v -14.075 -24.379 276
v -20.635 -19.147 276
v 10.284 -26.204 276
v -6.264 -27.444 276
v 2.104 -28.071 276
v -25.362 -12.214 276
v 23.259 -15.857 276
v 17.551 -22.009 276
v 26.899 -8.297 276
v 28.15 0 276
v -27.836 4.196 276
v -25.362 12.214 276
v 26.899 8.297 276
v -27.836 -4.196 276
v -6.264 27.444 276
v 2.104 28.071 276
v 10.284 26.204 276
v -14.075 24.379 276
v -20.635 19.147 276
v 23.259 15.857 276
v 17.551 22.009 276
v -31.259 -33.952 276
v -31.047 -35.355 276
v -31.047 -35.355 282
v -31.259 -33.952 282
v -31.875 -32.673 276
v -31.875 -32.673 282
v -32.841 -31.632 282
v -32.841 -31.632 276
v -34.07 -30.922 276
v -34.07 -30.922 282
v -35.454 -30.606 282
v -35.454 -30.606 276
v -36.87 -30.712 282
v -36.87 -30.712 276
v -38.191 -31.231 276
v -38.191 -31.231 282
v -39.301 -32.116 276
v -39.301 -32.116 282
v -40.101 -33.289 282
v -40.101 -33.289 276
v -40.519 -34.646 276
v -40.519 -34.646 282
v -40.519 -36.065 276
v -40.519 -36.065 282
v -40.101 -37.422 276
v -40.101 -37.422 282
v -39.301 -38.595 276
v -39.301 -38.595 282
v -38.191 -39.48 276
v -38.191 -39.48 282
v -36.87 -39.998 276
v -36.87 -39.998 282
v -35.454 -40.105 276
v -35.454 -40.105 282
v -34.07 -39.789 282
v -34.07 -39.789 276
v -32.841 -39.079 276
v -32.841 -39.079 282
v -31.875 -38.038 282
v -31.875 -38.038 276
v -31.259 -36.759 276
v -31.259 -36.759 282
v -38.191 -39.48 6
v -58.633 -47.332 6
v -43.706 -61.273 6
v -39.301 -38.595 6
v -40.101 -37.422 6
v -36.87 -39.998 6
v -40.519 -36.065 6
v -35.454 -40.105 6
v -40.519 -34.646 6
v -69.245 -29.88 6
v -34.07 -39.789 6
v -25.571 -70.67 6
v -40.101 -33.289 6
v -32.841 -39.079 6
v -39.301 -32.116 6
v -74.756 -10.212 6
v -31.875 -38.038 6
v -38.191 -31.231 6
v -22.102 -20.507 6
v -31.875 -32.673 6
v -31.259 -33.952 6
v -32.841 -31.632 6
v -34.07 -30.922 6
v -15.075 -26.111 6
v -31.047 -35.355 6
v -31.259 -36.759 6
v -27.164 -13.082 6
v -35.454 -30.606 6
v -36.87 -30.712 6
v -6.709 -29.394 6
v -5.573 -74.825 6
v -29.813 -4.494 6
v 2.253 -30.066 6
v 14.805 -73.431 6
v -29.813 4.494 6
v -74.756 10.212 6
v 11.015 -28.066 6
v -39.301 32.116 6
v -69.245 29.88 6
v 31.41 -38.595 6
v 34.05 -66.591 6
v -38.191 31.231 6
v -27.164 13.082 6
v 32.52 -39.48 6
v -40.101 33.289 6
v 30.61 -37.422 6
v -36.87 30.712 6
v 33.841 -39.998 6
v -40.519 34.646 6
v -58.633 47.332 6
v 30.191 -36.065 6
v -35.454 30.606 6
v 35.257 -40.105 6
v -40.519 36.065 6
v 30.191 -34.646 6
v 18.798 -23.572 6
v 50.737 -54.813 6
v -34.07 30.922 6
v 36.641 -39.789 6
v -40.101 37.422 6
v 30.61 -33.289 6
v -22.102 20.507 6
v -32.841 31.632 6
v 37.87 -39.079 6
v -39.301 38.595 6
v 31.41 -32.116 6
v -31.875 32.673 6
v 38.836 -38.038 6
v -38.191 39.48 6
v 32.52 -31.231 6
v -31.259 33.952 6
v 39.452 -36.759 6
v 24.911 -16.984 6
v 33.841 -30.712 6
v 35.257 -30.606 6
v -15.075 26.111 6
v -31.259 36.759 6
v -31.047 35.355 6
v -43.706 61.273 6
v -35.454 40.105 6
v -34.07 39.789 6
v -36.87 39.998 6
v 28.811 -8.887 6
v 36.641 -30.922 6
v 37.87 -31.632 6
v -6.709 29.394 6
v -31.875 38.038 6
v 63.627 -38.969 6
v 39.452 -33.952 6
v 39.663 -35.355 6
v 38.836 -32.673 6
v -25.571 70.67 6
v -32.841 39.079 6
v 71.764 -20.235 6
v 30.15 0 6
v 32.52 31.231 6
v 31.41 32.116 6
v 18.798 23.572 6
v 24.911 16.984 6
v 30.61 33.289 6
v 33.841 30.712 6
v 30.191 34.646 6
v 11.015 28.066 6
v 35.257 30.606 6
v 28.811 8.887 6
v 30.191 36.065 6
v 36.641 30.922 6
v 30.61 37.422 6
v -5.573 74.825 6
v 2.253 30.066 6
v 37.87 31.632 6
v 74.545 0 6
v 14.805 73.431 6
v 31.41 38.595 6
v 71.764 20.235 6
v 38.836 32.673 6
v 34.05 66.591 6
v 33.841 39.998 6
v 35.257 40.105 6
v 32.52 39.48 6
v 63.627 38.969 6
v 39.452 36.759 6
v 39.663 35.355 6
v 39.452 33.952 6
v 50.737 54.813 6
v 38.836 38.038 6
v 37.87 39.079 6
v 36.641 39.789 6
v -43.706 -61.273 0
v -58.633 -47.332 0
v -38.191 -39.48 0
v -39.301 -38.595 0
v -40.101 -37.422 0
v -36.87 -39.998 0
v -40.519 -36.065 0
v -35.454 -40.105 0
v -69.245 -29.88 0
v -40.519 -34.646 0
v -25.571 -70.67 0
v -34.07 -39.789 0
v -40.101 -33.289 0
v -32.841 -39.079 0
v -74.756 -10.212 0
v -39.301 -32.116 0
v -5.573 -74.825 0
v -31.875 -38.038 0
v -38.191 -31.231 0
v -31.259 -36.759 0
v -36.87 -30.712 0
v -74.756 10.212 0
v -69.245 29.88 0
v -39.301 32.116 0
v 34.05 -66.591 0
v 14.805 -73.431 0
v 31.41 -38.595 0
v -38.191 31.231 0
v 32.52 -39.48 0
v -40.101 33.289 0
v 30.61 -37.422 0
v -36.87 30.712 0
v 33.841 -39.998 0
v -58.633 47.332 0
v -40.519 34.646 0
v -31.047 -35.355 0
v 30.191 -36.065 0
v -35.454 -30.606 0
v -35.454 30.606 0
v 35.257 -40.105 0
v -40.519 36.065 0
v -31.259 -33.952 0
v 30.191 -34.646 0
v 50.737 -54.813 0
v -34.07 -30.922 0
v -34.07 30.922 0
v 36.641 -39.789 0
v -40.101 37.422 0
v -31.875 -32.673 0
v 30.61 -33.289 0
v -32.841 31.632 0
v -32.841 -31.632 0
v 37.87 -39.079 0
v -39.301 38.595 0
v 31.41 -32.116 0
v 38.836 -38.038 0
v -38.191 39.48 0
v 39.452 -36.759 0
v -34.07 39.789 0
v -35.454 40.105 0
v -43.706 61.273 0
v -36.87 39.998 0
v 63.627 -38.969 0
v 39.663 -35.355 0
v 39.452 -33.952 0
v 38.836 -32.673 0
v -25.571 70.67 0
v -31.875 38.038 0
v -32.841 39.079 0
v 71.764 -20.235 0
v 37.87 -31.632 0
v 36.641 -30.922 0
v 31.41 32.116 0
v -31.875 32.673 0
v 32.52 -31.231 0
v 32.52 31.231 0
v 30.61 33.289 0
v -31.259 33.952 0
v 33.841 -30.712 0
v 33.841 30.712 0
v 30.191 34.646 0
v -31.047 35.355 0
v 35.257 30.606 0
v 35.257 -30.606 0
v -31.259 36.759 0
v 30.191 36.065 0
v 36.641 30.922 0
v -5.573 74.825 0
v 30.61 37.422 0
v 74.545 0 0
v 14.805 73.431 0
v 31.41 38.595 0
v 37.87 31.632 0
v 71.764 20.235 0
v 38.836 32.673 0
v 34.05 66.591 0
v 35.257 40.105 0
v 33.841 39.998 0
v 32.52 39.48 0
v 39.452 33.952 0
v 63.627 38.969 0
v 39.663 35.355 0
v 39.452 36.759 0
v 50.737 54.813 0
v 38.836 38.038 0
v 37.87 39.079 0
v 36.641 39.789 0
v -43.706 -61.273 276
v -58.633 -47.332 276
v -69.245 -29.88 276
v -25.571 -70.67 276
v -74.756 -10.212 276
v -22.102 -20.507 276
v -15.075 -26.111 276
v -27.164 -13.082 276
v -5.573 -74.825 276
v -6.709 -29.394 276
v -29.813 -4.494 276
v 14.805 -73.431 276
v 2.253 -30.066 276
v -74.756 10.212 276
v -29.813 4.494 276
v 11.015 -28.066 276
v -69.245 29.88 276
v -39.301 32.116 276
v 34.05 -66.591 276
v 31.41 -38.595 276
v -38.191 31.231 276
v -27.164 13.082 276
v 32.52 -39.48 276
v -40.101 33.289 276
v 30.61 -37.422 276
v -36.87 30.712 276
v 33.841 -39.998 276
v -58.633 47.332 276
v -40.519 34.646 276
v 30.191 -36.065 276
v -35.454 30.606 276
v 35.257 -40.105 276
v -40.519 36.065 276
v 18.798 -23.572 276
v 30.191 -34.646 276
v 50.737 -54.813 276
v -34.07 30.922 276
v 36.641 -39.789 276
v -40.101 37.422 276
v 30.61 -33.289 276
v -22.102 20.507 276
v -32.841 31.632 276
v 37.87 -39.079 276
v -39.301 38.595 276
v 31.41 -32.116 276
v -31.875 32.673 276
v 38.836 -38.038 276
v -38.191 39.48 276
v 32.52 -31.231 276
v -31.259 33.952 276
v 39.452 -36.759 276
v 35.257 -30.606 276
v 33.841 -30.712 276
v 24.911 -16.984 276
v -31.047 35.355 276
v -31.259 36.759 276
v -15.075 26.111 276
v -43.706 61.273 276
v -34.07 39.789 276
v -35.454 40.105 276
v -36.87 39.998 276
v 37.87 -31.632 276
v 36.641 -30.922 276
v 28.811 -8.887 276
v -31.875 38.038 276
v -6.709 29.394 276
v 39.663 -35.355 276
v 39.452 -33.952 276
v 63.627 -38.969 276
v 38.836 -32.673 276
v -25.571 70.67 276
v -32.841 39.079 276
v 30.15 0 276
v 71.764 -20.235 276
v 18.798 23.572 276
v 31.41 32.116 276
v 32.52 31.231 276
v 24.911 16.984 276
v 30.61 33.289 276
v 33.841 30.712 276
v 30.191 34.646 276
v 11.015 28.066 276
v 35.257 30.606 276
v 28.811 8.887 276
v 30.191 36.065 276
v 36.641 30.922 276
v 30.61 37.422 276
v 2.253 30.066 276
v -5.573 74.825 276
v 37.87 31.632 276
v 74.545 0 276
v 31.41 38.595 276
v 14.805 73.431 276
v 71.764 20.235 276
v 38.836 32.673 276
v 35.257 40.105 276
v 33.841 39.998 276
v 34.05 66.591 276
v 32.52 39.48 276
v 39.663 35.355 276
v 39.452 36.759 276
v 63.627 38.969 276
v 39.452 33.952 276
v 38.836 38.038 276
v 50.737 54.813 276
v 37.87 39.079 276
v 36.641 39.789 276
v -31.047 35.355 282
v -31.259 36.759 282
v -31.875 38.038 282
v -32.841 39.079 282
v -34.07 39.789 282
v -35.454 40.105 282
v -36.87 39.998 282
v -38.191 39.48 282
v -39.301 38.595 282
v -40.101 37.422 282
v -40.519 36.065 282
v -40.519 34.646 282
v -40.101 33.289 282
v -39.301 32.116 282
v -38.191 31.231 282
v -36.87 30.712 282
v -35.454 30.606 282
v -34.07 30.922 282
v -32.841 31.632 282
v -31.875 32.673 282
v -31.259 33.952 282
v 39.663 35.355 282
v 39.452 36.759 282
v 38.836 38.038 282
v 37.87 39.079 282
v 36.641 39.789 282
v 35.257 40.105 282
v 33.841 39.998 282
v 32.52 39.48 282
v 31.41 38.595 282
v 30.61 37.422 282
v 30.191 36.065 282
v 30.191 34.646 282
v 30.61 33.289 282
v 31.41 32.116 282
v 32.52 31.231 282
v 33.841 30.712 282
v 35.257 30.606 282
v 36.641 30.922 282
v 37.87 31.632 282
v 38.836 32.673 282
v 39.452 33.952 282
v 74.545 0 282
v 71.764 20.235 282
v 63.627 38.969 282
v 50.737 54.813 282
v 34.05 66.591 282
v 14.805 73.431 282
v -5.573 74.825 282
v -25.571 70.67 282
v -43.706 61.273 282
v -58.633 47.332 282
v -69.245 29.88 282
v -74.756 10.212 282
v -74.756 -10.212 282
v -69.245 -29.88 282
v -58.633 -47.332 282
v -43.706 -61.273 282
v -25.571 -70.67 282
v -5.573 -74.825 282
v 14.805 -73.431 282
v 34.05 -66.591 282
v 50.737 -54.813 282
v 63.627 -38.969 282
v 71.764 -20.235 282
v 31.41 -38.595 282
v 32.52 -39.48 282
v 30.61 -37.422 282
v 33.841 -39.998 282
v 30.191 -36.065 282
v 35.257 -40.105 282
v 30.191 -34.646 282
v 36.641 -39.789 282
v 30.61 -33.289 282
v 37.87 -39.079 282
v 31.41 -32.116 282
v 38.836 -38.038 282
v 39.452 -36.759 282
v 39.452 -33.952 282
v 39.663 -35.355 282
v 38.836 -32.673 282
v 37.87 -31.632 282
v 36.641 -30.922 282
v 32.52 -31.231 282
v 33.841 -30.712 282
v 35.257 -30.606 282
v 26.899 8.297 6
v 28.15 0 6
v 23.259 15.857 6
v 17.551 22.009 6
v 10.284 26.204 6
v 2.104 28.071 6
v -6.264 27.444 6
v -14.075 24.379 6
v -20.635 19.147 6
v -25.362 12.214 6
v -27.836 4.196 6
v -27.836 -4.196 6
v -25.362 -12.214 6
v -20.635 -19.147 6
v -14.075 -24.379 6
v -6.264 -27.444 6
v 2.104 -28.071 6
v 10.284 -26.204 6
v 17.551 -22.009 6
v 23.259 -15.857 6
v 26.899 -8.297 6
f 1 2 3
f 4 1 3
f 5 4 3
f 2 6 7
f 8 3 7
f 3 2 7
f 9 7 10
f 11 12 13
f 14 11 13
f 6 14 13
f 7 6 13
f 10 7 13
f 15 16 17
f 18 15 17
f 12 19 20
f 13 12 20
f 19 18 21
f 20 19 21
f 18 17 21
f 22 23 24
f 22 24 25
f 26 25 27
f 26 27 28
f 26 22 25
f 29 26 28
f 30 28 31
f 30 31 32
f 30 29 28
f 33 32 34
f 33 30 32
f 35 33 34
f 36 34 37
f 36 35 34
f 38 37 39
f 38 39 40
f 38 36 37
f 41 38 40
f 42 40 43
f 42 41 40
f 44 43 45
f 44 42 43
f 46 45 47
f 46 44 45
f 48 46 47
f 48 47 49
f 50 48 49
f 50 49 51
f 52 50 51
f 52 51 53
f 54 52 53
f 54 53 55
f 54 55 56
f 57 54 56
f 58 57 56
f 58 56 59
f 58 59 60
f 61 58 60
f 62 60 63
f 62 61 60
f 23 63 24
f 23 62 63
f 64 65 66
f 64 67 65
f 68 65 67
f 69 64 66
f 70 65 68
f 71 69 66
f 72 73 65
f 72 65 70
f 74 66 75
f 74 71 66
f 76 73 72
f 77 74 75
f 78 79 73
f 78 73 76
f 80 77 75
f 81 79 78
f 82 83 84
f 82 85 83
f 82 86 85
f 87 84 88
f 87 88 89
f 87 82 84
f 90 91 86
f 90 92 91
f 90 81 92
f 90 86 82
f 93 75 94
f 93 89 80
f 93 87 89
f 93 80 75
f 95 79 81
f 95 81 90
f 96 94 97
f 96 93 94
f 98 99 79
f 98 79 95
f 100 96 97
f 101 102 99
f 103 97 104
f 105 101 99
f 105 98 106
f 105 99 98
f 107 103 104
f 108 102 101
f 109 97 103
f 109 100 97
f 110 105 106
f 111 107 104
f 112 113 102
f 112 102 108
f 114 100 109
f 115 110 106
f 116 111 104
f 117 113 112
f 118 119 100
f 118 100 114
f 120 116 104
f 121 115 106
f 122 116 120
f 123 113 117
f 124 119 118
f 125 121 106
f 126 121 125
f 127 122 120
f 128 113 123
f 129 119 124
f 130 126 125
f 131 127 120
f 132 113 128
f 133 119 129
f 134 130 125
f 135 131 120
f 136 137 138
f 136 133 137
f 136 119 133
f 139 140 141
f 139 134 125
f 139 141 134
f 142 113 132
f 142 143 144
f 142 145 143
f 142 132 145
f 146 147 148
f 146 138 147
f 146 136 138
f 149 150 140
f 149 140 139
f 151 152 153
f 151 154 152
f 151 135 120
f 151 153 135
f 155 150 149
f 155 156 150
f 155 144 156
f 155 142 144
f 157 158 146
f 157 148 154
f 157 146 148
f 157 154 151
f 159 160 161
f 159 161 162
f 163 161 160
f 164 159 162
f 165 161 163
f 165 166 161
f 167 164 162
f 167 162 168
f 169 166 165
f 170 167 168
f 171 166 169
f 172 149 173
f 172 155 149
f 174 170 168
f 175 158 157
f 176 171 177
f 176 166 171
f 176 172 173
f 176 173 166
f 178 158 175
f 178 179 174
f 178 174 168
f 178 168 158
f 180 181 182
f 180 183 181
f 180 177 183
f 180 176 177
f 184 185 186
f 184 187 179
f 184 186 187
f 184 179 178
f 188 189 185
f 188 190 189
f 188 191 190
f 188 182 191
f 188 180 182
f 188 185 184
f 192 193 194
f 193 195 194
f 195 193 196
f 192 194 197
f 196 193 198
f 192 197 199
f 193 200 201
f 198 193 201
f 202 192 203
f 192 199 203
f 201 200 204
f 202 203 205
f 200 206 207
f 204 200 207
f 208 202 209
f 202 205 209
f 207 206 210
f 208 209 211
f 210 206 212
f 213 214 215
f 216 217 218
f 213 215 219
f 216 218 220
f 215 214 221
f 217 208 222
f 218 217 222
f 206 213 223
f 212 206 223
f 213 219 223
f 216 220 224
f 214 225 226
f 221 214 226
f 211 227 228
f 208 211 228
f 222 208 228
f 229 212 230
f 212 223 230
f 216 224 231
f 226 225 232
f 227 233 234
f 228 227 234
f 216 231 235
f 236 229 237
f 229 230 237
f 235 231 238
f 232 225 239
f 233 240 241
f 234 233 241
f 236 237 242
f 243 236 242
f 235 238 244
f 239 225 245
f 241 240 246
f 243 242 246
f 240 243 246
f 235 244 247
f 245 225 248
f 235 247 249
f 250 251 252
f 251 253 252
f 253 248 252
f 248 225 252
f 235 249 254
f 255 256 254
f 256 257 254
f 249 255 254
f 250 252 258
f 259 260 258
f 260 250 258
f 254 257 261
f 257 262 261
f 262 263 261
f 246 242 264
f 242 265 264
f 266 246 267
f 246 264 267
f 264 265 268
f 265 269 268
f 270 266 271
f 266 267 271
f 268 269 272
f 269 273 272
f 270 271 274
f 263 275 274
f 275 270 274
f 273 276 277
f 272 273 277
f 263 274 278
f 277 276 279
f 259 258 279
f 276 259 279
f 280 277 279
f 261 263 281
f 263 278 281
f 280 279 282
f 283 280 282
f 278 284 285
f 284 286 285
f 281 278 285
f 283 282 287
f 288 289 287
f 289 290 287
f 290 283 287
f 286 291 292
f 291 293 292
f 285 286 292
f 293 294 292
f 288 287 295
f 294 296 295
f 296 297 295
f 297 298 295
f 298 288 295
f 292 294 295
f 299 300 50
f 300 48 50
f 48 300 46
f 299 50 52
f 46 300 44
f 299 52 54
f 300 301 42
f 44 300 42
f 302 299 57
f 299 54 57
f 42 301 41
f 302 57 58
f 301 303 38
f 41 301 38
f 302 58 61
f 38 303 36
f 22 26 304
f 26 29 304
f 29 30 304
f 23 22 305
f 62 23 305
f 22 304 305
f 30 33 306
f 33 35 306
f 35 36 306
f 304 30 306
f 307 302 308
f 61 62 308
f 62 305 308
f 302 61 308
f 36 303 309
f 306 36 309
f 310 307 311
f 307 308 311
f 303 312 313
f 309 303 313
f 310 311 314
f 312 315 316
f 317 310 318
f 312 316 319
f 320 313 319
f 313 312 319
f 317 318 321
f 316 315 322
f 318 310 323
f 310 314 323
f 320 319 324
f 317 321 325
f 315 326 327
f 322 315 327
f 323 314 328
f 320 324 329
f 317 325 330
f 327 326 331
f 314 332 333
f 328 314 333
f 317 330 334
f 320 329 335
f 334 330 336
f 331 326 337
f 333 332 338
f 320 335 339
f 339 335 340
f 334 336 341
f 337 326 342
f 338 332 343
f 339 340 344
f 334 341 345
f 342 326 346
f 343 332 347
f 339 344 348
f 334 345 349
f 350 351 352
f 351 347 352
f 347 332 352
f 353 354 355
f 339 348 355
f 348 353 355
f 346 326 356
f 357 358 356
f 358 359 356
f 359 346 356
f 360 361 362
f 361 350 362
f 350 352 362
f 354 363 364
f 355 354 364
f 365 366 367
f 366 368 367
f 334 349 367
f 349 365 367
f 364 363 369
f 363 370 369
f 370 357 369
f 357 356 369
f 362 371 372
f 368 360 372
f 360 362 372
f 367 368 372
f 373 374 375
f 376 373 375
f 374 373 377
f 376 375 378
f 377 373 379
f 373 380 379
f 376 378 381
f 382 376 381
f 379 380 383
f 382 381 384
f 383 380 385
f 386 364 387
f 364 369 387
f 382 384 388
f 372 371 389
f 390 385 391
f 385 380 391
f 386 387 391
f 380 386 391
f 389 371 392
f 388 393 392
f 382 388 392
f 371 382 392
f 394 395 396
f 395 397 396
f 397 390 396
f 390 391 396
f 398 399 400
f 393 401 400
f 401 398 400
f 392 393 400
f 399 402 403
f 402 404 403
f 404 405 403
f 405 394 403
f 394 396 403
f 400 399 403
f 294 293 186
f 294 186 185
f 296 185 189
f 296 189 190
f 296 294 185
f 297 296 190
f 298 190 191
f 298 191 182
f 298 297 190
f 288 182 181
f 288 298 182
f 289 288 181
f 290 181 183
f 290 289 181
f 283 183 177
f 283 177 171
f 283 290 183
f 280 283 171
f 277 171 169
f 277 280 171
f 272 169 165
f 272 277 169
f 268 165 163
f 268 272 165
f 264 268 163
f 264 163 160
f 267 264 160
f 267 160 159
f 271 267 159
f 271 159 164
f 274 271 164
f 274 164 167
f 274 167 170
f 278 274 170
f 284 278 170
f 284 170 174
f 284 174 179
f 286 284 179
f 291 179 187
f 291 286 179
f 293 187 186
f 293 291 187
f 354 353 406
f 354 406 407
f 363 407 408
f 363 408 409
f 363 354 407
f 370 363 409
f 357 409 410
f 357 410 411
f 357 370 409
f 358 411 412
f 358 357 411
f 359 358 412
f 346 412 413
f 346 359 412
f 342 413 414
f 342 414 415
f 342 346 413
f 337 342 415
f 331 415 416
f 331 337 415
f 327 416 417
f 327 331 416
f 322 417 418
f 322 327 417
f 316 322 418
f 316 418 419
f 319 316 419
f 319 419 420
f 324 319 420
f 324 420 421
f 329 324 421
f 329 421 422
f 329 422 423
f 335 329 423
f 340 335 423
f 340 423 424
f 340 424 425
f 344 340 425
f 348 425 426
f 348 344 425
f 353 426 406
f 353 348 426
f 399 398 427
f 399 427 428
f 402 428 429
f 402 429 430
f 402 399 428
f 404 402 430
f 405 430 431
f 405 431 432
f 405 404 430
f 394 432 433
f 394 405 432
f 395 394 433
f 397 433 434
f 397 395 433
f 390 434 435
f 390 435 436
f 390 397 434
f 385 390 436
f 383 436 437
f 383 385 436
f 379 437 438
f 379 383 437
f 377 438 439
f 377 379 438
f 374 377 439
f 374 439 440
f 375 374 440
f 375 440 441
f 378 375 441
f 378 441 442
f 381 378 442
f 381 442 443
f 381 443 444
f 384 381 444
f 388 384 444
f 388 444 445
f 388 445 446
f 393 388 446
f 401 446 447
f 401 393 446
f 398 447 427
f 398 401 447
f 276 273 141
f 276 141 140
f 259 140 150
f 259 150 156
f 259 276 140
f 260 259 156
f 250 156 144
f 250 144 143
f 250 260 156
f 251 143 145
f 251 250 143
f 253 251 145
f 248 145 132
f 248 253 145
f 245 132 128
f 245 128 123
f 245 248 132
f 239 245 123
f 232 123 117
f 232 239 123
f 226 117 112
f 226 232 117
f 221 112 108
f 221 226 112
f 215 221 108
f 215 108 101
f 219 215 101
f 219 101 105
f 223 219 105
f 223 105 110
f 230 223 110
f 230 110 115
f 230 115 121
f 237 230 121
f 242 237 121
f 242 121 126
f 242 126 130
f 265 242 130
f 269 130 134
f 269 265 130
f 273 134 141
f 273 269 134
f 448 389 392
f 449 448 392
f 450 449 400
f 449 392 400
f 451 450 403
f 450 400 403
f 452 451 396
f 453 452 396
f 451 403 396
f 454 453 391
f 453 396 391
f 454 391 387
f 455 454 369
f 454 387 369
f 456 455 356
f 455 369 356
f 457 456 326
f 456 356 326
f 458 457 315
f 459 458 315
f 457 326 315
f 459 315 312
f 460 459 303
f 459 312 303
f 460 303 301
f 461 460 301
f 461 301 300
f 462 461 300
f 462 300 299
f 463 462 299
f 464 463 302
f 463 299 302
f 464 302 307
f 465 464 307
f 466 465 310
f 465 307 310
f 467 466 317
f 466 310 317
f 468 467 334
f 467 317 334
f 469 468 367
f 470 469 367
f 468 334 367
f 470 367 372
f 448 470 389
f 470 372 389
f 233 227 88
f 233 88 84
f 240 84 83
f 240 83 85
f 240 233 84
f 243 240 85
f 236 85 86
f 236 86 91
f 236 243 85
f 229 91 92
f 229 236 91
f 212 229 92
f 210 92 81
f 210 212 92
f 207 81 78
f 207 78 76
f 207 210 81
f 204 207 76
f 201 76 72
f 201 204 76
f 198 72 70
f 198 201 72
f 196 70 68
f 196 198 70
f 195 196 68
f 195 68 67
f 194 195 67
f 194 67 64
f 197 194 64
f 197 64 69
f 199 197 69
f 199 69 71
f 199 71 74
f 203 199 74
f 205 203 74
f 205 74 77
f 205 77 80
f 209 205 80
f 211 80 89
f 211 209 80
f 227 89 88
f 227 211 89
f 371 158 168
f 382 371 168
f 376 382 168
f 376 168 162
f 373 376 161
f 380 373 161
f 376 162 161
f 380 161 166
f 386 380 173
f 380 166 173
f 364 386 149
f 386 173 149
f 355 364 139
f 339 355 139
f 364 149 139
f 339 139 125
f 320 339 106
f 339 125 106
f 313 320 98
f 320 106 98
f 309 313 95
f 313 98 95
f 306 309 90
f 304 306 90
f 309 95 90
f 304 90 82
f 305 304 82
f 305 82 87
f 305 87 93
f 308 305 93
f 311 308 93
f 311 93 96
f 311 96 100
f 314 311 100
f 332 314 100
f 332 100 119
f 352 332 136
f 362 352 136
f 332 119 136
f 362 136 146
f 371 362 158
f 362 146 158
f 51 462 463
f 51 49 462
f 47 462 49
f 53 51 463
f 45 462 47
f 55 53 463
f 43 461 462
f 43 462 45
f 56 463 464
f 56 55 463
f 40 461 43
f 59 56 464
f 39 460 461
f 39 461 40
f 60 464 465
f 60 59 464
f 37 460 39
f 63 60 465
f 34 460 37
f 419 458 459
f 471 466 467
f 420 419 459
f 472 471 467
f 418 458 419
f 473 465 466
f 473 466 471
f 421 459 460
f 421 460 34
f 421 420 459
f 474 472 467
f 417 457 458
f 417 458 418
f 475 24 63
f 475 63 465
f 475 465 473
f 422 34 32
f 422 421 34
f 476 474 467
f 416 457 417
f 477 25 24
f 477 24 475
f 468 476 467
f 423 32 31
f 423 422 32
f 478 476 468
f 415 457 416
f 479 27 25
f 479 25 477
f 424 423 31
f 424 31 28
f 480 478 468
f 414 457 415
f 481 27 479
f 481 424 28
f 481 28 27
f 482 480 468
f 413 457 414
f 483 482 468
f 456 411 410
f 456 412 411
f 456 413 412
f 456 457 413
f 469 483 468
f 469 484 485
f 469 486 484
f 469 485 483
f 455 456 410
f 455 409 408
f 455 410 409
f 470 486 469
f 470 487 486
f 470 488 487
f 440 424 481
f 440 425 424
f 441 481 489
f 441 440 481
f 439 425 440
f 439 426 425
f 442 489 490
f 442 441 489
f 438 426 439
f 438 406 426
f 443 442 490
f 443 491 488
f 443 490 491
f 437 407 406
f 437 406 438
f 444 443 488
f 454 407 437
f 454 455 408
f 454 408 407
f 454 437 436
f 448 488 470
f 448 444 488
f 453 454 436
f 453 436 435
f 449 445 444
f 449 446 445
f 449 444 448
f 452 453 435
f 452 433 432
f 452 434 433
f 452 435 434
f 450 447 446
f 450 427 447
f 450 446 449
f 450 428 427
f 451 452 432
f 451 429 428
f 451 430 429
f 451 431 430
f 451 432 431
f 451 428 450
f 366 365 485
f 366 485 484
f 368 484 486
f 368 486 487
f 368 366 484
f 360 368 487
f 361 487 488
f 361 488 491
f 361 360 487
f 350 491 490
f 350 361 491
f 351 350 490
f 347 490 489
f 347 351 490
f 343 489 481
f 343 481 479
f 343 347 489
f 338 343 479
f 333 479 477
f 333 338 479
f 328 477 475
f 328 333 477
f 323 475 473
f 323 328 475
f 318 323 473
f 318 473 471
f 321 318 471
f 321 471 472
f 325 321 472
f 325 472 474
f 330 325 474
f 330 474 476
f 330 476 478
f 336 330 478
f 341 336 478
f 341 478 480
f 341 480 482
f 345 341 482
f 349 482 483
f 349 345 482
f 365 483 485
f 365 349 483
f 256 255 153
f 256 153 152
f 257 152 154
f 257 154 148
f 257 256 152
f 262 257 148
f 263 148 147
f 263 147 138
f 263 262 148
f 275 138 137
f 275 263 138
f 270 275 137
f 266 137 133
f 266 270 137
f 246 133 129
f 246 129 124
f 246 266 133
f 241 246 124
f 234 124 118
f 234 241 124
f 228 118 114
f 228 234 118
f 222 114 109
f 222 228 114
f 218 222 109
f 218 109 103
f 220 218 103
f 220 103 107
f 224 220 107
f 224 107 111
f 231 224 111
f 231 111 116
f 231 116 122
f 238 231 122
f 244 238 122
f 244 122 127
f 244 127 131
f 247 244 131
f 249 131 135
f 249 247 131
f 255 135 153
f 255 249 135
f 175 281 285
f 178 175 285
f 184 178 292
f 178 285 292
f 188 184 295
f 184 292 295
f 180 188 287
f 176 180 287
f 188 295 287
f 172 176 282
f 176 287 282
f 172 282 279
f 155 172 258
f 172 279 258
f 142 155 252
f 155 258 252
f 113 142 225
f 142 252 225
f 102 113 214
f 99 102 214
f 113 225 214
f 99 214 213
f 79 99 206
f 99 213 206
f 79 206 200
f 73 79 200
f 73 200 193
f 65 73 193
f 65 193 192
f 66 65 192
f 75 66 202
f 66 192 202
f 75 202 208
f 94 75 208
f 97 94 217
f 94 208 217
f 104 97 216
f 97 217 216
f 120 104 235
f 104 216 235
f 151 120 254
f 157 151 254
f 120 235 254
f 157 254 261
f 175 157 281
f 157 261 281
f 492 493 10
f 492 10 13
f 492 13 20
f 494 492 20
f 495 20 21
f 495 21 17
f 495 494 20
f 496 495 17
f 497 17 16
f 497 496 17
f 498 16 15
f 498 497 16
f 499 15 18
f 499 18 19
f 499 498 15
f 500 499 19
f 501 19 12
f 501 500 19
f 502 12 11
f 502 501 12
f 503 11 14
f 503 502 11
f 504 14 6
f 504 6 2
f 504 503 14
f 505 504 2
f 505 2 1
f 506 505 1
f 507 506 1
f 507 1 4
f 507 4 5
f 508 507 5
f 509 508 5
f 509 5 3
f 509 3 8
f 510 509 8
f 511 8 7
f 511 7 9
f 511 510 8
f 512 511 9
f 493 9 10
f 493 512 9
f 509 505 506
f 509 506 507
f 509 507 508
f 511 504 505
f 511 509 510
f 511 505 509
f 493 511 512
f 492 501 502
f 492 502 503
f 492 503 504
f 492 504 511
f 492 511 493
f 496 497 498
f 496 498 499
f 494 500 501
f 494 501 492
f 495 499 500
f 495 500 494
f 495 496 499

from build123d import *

# Parameters (mm, degrees)
F0_R     = 75
F0_R_2   = 4.7625
F1_DEPTH = 6
F2_R     = 30.15
F2_R_2   = 28.15
F3_DEPTH = 270
F5_R     = 75
F5_R_2   = 4.7625
F6_DEPTH = 6


with BuildPart() as f1:
    # F0 (on Top) → F1 (new body)
    with BuildSketch(Plane.XY):
        with Locations((-0.454545, 0)):
            Circle(F0_R)
        with Locations((-35.809885, -35.355339)):
            Circle(F0_R_2, mode=Mode.SUBTRACT)
        with Locations((34.900794, -35.355339)):
            Circle(F0_R_2, mode=Mode.SUBTRACT)
        with Locations((-35.809885, 35.355339)):
            Circle(F0_R_2, mode=Mode.SUBTRACT)
        with Locations((34.900794, 35.355339)):
            Circle(F0_R_2, mode=Mode.SUBTRACT)
    extrude(amount=F1_DEPTH)

    # F2 (on face) → F3 (join)
    with BuildSketch(Plane.XY.offset(6)):
        Circle(F2_R)
        Circle(F2_R_2, mode=Mode.SUBTRACT)
    extrude(amount=F3_DEPTH)

    # F5 (on offset) → F6 (join)
    with BuildSketch(Plane.XY.offset(276)):
        with Locations((-0.454545, 0)):
            Circle(F5_R)
        with Locations((-35.809885, -35.355339)):
            Circle(F5_R_2, mode=Mode.SUBTRACT)
        with Locations((34.900794, -35.355339)):
            Circle(F5_R_2, mode=Mode.SUBTRACT)
        with Locations((-35.809885, 35.355339)):
            Circle(F5_R_2, mode=Mode.SUBTRACT)
        with Locations((34.900794, 35.355339)):
            Circle(F5_R_2, mode=Mode.SUBTRACT)
    extrude(amount=F6_DEPTH)


solid = f1.part
